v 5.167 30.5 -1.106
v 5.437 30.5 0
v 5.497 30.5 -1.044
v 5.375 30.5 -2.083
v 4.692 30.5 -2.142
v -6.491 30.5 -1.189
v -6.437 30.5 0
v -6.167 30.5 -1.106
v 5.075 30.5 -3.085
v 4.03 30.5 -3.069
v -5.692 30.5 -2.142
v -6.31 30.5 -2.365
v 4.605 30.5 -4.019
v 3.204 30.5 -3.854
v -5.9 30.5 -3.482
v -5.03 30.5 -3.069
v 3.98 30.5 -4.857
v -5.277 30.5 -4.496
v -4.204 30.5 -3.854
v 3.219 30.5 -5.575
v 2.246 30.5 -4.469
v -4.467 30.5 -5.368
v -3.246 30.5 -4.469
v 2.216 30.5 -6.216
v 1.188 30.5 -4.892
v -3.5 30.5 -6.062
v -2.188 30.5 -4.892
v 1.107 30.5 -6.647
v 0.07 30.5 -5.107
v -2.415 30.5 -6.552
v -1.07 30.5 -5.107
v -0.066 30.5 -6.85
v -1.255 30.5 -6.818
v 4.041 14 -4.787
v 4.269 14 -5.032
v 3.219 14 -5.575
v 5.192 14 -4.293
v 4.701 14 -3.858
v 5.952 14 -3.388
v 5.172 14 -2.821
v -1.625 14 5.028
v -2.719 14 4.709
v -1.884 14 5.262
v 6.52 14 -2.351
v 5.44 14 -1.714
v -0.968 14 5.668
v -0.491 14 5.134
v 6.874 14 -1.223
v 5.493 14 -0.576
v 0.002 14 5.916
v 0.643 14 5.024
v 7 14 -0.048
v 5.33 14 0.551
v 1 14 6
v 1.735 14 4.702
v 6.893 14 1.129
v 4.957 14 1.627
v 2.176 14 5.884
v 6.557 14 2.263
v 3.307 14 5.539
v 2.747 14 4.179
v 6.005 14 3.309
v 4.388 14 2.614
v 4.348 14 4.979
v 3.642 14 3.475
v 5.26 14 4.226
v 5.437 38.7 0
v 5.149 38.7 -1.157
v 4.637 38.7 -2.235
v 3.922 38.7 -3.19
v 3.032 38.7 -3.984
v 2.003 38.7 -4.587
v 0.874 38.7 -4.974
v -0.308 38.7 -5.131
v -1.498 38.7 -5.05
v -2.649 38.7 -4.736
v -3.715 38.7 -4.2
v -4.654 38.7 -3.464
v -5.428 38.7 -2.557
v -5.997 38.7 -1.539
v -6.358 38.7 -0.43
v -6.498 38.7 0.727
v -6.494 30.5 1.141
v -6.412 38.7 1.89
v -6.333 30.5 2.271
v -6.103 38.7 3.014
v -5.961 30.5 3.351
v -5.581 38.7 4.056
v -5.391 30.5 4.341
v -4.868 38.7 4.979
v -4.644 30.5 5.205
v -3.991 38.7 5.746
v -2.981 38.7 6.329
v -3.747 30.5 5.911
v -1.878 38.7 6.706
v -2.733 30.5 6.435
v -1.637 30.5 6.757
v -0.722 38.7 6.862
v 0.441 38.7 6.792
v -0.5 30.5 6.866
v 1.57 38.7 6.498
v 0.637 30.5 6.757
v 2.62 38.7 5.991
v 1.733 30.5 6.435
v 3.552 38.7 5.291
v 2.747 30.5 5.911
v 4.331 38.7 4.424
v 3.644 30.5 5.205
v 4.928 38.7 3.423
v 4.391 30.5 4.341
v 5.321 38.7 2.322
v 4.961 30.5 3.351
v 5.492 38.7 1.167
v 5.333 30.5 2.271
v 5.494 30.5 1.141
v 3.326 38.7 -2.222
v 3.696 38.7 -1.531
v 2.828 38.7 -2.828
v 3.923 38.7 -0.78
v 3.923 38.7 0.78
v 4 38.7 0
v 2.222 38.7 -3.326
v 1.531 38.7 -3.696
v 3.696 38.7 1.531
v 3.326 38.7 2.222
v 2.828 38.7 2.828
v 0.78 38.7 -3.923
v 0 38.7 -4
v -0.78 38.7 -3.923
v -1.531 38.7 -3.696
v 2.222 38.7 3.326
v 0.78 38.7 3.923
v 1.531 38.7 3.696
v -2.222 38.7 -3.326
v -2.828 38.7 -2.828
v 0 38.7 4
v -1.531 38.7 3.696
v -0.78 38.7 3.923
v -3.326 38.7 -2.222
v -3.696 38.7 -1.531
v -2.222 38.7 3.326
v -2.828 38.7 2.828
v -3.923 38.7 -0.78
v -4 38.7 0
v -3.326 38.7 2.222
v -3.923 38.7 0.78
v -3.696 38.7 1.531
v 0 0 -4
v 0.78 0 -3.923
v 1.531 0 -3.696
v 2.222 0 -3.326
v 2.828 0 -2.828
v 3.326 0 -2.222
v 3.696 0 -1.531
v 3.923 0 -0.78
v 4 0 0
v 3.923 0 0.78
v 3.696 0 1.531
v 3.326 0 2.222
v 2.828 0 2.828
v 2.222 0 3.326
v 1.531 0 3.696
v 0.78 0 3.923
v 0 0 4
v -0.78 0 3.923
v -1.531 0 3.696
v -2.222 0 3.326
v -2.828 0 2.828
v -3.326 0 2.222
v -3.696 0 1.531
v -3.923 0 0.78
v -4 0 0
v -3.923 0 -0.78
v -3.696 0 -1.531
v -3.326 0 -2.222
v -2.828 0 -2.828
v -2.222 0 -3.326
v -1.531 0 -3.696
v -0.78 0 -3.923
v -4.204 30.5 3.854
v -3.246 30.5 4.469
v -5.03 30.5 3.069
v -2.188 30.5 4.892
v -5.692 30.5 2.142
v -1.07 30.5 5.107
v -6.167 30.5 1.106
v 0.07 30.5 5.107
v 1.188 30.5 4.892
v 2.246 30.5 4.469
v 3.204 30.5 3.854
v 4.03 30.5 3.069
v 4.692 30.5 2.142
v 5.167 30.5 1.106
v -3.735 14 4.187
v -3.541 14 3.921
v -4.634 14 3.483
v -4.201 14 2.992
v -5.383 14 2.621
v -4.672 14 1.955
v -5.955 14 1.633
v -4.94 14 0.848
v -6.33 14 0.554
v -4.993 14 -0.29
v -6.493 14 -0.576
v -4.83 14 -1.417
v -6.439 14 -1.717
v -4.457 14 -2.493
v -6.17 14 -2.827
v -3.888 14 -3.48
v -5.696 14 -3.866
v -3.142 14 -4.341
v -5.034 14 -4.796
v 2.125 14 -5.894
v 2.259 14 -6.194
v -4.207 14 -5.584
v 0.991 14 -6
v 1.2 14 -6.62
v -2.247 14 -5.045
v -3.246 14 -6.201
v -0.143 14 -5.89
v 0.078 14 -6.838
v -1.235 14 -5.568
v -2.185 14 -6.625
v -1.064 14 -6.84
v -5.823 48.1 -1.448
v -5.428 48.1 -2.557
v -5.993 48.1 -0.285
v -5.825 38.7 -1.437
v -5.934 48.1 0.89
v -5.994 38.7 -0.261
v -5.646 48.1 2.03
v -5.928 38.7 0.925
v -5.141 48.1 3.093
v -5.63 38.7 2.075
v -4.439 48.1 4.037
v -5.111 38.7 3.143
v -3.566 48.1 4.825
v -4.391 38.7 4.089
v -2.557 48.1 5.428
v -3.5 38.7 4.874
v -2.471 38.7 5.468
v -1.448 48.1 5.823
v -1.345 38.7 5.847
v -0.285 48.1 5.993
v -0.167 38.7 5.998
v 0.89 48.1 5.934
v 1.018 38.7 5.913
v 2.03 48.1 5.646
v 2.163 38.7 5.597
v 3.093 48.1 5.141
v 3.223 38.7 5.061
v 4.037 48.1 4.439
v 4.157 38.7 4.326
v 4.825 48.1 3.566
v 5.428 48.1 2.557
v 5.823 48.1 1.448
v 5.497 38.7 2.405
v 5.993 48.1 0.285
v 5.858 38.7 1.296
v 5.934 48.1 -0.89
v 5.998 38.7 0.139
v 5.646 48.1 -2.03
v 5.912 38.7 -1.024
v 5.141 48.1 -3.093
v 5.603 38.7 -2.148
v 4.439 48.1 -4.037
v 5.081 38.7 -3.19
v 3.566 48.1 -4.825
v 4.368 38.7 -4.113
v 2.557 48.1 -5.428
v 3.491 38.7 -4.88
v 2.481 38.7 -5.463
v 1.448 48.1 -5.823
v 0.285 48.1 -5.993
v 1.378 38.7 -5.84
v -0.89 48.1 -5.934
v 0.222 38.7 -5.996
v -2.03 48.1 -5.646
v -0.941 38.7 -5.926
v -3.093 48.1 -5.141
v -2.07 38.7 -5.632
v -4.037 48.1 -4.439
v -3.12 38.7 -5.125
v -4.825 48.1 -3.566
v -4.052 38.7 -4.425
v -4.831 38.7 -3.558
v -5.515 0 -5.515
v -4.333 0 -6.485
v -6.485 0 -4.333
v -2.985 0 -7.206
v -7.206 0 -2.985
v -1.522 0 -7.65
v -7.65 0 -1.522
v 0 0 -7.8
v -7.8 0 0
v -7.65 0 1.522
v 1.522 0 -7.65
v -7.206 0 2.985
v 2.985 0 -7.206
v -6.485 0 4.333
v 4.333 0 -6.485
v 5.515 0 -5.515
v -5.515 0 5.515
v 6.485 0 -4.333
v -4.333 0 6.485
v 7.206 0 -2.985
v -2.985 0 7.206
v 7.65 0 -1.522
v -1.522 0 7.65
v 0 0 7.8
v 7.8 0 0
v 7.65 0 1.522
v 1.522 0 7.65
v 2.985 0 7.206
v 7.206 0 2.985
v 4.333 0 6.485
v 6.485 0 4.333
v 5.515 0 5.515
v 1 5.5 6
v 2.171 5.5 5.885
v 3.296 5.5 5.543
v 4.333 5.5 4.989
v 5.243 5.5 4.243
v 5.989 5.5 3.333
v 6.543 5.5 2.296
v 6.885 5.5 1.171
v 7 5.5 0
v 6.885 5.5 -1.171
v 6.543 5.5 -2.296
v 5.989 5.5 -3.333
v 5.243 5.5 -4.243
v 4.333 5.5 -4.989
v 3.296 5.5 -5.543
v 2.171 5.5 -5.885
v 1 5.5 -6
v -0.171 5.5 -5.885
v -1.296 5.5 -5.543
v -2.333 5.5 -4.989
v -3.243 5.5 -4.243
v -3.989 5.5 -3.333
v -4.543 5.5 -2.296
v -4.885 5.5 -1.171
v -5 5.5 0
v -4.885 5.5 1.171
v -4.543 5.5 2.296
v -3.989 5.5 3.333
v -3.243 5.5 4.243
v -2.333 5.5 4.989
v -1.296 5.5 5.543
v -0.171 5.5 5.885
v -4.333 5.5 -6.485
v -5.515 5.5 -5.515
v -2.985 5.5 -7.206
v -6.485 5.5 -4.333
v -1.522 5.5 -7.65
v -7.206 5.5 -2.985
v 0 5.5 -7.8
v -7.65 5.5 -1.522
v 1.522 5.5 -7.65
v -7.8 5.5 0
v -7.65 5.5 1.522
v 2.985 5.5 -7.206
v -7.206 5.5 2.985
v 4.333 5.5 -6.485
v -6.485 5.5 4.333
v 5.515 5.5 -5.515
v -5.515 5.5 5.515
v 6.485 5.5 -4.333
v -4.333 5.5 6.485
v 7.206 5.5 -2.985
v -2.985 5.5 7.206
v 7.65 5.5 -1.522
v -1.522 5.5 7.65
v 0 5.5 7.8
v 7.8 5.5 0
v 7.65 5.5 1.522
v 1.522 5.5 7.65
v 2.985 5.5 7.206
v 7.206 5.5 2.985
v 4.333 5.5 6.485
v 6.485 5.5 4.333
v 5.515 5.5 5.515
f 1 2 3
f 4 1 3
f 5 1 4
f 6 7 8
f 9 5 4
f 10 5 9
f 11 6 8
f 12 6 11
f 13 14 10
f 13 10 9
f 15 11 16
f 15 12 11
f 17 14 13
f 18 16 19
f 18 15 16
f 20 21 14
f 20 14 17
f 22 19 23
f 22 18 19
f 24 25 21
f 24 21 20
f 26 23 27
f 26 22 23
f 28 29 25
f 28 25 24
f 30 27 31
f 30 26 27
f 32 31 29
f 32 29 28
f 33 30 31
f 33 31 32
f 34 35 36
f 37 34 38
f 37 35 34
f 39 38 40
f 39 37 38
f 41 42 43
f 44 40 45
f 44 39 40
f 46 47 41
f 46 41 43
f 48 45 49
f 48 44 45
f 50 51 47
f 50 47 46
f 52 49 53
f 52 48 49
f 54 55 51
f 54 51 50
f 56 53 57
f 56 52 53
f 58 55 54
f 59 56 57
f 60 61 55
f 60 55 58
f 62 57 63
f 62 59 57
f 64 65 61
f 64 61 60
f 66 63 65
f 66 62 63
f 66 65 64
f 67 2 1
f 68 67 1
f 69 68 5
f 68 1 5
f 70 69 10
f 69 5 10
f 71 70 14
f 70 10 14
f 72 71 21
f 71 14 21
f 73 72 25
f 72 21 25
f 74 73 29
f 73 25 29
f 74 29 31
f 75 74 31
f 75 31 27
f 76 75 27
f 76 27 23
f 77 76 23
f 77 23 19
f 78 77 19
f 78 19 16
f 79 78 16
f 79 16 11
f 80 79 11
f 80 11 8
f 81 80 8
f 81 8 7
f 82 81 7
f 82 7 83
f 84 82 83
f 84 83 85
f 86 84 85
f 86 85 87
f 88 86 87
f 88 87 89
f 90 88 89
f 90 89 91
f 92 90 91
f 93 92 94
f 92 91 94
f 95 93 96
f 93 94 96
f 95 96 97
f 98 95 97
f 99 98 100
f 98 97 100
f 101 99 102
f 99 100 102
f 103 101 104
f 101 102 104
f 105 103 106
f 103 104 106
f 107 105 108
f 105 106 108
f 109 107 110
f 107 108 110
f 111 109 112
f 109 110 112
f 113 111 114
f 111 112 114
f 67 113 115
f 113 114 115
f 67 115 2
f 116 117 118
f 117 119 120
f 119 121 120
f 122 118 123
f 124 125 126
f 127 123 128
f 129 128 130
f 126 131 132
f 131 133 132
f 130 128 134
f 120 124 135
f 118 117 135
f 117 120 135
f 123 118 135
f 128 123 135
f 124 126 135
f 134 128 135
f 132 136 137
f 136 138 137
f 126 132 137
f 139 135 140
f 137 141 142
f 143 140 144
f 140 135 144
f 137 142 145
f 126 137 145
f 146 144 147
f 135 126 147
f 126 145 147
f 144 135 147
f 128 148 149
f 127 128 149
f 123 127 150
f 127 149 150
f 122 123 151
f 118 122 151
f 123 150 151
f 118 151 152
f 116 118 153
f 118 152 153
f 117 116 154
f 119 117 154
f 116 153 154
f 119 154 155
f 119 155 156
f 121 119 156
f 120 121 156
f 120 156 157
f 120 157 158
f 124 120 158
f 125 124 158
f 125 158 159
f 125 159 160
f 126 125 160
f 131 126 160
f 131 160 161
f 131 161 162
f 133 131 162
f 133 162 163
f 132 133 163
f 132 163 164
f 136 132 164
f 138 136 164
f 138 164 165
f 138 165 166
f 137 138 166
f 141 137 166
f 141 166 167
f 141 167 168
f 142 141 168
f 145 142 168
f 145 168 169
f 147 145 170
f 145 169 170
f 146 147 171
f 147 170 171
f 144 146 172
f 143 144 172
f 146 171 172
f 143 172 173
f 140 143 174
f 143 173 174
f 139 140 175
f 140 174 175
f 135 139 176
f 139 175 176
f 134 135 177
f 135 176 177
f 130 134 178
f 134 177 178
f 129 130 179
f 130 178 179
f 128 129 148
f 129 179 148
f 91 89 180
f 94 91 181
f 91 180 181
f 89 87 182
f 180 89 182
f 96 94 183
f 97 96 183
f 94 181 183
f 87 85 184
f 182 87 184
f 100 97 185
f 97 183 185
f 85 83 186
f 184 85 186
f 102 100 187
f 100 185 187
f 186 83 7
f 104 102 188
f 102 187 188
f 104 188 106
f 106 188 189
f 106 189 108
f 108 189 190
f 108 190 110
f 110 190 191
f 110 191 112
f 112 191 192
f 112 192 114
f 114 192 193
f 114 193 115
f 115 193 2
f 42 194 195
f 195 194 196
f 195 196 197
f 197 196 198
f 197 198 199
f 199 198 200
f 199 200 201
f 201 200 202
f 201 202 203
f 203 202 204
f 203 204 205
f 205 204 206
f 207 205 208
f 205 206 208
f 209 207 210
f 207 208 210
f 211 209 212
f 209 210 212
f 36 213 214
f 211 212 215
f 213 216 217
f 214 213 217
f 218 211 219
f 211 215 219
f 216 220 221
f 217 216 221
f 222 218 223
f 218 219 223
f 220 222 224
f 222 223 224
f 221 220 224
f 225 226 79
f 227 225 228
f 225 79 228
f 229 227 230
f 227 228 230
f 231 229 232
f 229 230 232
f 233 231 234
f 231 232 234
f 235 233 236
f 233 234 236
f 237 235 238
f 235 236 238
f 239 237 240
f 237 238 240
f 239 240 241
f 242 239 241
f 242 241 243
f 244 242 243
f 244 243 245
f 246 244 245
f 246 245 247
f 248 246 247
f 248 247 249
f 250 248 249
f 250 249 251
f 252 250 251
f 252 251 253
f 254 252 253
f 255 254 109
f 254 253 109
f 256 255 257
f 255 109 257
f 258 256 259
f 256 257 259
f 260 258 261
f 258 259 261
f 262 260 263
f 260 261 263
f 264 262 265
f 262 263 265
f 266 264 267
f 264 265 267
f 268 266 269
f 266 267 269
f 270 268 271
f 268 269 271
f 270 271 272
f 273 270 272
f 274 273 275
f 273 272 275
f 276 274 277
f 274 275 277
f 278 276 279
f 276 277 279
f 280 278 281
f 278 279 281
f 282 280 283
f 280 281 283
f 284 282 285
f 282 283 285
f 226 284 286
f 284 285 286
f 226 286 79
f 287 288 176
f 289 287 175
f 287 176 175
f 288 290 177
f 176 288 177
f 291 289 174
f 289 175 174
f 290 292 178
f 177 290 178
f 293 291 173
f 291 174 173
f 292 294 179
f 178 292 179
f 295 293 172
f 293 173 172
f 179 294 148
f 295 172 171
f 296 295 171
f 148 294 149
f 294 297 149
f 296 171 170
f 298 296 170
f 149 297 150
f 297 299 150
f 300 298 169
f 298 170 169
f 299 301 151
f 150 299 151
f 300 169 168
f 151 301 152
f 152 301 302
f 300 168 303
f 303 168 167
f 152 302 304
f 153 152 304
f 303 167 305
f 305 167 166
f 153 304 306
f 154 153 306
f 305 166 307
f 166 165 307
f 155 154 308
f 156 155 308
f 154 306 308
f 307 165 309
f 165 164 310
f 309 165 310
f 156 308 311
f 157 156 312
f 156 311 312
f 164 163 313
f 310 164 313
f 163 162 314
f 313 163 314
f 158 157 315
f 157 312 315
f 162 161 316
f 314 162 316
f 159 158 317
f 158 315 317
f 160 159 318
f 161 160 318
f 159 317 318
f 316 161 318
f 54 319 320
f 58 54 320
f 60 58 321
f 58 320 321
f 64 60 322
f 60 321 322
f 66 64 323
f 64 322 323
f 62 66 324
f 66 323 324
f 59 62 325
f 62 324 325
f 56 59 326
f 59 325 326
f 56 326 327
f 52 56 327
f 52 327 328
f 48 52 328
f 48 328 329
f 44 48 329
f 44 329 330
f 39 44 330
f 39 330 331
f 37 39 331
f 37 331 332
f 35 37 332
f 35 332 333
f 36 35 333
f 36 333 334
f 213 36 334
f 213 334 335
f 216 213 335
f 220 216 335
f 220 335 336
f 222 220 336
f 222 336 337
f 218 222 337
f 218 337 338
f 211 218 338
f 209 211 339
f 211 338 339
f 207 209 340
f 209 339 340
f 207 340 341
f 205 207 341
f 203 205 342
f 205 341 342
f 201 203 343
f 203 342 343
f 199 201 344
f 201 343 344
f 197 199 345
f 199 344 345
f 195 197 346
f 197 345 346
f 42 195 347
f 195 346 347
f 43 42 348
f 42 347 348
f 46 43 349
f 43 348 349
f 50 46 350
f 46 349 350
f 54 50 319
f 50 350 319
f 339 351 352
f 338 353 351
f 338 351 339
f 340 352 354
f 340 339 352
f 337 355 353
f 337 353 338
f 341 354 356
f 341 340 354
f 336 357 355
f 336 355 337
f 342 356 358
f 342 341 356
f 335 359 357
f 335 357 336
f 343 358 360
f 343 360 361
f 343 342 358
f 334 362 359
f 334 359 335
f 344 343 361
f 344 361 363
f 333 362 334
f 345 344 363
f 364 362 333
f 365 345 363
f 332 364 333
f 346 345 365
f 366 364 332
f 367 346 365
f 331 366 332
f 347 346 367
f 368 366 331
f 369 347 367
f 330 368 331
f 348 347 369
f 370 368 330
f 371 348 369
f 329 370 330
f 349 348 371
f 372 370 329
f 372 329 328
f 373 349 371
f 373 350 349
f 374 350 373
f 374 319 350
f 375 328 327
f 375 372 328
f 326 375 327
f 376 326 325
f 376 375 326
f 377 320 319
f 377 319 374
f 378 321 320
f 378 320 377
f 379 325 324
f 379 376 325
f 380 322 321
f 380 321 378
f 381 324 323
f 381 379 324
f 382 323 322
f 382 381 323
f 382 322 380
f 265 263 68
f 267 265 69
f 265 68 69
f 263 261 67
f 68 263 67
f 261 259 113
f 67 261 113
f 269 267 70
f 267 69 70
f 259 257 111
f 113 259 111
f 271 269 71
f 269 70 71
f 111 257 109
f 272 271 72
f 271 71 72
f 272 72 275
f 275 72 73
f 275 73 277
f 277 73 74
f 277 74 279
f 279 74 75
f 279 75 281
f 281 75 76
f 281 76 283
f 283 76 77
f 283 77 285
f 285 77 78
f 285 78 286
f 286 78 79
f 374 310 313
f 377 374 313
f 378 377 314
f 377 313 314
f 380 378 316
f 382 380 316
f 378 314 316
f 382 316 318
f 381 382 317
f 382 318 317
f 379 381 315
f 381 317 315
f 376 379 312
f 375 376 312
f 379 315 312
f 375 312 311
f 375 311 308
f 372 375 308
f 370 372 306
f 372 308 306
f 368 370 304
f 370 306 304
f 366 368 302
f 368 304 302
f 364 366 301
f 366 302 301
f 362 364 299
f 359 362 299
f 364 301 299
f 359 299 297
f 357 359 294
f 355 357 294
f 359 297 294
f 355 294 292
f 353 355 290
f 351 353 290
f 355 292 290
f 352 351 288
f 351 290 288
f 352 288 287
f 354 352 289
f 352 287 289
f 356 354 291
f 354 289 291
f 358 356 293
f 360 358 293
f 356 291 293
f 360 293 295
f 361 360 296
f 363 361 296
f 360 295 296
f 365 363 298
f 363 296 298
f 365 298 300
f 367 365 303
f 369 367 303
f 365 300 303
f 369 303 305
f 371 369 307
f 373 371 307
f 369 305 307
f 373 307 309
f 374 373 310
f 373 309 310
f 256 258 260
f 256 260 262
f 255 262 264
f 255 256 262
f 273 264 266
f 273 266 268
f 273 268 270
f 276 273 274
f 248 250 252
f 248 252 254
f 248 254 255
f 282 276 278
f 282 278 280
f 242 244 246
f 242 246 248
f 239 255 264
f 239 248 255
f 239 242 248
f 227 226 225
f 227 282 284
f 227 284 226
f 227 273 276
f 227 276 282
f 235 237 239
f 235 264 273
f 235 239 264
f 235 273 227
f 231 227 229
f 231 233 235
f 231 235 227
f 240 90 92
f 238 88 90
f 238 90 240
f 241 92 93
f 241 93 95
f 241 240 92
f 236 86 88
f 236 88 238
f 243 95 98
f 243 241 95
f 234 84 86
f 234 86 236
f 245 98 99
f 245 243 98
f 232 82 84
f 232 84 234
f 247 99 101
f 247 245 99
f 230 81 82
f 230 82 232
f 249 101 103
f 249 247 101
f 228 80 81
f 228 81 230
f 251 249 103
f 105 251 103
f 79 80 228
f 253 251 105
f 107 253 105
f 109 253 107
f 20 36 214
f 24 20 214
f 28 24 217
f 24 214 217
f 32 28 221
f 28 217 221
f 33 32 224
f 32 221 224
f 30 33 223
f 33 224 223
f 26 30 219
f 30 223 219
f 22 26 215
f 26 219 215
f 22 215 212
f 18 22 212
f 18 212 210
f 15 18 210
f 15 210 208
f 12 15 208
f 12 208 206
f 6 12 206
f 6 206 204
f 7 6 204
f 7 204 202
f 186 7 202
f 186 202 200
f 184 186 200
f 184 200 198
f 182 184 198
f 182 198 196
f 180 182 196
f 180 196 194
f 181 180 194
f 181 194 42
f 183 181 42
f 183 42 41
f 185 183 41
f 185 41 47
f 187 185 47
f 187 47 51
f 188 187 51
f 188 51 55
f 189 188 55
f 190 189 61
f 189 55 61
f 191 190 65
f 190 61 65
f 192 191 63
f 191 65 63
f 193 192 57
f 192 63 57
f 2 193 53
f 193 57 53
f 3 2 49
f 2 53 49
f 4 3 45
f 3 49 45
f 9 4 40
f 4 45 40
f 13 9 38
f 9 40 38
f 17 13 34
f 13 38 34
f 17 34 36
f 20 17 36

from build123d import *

# Parameters (mm, degrees)
SKETCH1_R           = 7.8
BOSS_EXTRUDE1_DEPTH = 5.5
SKETCH2_R           = 6
BOSS_EXTRUDE2_DEPTH = 8.5
SKETCH4_R           = 6
BOSS_EXTRUDE3_DEPTH = 16.5
SKETCH7_R           = 6
BOSS_EXTRUDE4_DEPTH = 8.2
SKETCH3_R           = 4
CUT_EXTRUDE2_DEPTH  = 41.241396596
SKETCH8_R           = 6
BOSS_EXTRUDE5_DEPTH = 9.4


with BuildPart() as part:
    # Sketch1 → Boss-Extrude1 (new body)
    with BuildSketch(Plane(origin=(0, 0, 0), x_dir=(1, 0, 0), z_dir=(0, 1, 0))):
        with Locations(Location((0, 0, 0), (0, 0, 270))):
            Circle(SKETCH1_R)
    extrude(amount=BOSS_EXTRUDE1_DEPTH)

    # Sketch2 → Boss-Extrude2 (add)
    with BuildSketch(Plane(origin=(0, 5.5, 0), x_dir=(1, 0, 0), z_dir=(0, 1, 0))):
        with Locations(Location((1, 0, 0), (0, 0, 270))):
            Circle(SKETCH2_R)
    extrude(amount=BOSS_EXTRUDE2_DEPTH)

    # Sketch4 → Boss-Extrude3 (add)
    with BuildSketch(Plane(origin=(0, 14, 0), x_dir=(1, 0, 0), z_dir=(0, 1, 0))):
        with Locations(Location((-0.5, 0.866025404, 0), (0, 0, 51.701078932))):
            Circle(SKETCH4_R)
    extrude(amount=BOSS_EXTRUDE3_DEPTH)

    # Sketch7 → Boss-Extrude4 (add)
    with BuildSketch(Plane(origin=(0, 30.5, 0), x_dir=(1, 0, 0), z_dir=(0, 1, 0))):
        with Locations(Location((-0.5, -0.866025404, 0), (0, 0, 8.298921068))):
            Circle(SKETCH7_R)
    extrude(amount=BOSS_EXTRUDE4_DEPTH)

    # Sketch3 → Cut-Extrude2 (cut, through all)
    with BuildSketch(Plane.XZ):
        with Locations(Location((0, 0, 0), (0, 0, 270))):
            Circle(SKETCH3_R)
    extrude(amount=-CUT_EXTRUDE2_DEPTH, mode=Mode.SUBTRACT)

    # Sketch8 → Boss-Extrude5 (add)
    with BuildSketch(Plane(origin=(0, 38.7, 0), x_dir=(1, 0, 0), z_dir=(0, 1, 0))):
        with Locations(Location((0, 0, 0), (0, 0, 154.780191847))):
            Circle(SKETCH8_R)
    extrude(amount=BOSS_EXTRUDE5_DEPTH)


solid = part.part
